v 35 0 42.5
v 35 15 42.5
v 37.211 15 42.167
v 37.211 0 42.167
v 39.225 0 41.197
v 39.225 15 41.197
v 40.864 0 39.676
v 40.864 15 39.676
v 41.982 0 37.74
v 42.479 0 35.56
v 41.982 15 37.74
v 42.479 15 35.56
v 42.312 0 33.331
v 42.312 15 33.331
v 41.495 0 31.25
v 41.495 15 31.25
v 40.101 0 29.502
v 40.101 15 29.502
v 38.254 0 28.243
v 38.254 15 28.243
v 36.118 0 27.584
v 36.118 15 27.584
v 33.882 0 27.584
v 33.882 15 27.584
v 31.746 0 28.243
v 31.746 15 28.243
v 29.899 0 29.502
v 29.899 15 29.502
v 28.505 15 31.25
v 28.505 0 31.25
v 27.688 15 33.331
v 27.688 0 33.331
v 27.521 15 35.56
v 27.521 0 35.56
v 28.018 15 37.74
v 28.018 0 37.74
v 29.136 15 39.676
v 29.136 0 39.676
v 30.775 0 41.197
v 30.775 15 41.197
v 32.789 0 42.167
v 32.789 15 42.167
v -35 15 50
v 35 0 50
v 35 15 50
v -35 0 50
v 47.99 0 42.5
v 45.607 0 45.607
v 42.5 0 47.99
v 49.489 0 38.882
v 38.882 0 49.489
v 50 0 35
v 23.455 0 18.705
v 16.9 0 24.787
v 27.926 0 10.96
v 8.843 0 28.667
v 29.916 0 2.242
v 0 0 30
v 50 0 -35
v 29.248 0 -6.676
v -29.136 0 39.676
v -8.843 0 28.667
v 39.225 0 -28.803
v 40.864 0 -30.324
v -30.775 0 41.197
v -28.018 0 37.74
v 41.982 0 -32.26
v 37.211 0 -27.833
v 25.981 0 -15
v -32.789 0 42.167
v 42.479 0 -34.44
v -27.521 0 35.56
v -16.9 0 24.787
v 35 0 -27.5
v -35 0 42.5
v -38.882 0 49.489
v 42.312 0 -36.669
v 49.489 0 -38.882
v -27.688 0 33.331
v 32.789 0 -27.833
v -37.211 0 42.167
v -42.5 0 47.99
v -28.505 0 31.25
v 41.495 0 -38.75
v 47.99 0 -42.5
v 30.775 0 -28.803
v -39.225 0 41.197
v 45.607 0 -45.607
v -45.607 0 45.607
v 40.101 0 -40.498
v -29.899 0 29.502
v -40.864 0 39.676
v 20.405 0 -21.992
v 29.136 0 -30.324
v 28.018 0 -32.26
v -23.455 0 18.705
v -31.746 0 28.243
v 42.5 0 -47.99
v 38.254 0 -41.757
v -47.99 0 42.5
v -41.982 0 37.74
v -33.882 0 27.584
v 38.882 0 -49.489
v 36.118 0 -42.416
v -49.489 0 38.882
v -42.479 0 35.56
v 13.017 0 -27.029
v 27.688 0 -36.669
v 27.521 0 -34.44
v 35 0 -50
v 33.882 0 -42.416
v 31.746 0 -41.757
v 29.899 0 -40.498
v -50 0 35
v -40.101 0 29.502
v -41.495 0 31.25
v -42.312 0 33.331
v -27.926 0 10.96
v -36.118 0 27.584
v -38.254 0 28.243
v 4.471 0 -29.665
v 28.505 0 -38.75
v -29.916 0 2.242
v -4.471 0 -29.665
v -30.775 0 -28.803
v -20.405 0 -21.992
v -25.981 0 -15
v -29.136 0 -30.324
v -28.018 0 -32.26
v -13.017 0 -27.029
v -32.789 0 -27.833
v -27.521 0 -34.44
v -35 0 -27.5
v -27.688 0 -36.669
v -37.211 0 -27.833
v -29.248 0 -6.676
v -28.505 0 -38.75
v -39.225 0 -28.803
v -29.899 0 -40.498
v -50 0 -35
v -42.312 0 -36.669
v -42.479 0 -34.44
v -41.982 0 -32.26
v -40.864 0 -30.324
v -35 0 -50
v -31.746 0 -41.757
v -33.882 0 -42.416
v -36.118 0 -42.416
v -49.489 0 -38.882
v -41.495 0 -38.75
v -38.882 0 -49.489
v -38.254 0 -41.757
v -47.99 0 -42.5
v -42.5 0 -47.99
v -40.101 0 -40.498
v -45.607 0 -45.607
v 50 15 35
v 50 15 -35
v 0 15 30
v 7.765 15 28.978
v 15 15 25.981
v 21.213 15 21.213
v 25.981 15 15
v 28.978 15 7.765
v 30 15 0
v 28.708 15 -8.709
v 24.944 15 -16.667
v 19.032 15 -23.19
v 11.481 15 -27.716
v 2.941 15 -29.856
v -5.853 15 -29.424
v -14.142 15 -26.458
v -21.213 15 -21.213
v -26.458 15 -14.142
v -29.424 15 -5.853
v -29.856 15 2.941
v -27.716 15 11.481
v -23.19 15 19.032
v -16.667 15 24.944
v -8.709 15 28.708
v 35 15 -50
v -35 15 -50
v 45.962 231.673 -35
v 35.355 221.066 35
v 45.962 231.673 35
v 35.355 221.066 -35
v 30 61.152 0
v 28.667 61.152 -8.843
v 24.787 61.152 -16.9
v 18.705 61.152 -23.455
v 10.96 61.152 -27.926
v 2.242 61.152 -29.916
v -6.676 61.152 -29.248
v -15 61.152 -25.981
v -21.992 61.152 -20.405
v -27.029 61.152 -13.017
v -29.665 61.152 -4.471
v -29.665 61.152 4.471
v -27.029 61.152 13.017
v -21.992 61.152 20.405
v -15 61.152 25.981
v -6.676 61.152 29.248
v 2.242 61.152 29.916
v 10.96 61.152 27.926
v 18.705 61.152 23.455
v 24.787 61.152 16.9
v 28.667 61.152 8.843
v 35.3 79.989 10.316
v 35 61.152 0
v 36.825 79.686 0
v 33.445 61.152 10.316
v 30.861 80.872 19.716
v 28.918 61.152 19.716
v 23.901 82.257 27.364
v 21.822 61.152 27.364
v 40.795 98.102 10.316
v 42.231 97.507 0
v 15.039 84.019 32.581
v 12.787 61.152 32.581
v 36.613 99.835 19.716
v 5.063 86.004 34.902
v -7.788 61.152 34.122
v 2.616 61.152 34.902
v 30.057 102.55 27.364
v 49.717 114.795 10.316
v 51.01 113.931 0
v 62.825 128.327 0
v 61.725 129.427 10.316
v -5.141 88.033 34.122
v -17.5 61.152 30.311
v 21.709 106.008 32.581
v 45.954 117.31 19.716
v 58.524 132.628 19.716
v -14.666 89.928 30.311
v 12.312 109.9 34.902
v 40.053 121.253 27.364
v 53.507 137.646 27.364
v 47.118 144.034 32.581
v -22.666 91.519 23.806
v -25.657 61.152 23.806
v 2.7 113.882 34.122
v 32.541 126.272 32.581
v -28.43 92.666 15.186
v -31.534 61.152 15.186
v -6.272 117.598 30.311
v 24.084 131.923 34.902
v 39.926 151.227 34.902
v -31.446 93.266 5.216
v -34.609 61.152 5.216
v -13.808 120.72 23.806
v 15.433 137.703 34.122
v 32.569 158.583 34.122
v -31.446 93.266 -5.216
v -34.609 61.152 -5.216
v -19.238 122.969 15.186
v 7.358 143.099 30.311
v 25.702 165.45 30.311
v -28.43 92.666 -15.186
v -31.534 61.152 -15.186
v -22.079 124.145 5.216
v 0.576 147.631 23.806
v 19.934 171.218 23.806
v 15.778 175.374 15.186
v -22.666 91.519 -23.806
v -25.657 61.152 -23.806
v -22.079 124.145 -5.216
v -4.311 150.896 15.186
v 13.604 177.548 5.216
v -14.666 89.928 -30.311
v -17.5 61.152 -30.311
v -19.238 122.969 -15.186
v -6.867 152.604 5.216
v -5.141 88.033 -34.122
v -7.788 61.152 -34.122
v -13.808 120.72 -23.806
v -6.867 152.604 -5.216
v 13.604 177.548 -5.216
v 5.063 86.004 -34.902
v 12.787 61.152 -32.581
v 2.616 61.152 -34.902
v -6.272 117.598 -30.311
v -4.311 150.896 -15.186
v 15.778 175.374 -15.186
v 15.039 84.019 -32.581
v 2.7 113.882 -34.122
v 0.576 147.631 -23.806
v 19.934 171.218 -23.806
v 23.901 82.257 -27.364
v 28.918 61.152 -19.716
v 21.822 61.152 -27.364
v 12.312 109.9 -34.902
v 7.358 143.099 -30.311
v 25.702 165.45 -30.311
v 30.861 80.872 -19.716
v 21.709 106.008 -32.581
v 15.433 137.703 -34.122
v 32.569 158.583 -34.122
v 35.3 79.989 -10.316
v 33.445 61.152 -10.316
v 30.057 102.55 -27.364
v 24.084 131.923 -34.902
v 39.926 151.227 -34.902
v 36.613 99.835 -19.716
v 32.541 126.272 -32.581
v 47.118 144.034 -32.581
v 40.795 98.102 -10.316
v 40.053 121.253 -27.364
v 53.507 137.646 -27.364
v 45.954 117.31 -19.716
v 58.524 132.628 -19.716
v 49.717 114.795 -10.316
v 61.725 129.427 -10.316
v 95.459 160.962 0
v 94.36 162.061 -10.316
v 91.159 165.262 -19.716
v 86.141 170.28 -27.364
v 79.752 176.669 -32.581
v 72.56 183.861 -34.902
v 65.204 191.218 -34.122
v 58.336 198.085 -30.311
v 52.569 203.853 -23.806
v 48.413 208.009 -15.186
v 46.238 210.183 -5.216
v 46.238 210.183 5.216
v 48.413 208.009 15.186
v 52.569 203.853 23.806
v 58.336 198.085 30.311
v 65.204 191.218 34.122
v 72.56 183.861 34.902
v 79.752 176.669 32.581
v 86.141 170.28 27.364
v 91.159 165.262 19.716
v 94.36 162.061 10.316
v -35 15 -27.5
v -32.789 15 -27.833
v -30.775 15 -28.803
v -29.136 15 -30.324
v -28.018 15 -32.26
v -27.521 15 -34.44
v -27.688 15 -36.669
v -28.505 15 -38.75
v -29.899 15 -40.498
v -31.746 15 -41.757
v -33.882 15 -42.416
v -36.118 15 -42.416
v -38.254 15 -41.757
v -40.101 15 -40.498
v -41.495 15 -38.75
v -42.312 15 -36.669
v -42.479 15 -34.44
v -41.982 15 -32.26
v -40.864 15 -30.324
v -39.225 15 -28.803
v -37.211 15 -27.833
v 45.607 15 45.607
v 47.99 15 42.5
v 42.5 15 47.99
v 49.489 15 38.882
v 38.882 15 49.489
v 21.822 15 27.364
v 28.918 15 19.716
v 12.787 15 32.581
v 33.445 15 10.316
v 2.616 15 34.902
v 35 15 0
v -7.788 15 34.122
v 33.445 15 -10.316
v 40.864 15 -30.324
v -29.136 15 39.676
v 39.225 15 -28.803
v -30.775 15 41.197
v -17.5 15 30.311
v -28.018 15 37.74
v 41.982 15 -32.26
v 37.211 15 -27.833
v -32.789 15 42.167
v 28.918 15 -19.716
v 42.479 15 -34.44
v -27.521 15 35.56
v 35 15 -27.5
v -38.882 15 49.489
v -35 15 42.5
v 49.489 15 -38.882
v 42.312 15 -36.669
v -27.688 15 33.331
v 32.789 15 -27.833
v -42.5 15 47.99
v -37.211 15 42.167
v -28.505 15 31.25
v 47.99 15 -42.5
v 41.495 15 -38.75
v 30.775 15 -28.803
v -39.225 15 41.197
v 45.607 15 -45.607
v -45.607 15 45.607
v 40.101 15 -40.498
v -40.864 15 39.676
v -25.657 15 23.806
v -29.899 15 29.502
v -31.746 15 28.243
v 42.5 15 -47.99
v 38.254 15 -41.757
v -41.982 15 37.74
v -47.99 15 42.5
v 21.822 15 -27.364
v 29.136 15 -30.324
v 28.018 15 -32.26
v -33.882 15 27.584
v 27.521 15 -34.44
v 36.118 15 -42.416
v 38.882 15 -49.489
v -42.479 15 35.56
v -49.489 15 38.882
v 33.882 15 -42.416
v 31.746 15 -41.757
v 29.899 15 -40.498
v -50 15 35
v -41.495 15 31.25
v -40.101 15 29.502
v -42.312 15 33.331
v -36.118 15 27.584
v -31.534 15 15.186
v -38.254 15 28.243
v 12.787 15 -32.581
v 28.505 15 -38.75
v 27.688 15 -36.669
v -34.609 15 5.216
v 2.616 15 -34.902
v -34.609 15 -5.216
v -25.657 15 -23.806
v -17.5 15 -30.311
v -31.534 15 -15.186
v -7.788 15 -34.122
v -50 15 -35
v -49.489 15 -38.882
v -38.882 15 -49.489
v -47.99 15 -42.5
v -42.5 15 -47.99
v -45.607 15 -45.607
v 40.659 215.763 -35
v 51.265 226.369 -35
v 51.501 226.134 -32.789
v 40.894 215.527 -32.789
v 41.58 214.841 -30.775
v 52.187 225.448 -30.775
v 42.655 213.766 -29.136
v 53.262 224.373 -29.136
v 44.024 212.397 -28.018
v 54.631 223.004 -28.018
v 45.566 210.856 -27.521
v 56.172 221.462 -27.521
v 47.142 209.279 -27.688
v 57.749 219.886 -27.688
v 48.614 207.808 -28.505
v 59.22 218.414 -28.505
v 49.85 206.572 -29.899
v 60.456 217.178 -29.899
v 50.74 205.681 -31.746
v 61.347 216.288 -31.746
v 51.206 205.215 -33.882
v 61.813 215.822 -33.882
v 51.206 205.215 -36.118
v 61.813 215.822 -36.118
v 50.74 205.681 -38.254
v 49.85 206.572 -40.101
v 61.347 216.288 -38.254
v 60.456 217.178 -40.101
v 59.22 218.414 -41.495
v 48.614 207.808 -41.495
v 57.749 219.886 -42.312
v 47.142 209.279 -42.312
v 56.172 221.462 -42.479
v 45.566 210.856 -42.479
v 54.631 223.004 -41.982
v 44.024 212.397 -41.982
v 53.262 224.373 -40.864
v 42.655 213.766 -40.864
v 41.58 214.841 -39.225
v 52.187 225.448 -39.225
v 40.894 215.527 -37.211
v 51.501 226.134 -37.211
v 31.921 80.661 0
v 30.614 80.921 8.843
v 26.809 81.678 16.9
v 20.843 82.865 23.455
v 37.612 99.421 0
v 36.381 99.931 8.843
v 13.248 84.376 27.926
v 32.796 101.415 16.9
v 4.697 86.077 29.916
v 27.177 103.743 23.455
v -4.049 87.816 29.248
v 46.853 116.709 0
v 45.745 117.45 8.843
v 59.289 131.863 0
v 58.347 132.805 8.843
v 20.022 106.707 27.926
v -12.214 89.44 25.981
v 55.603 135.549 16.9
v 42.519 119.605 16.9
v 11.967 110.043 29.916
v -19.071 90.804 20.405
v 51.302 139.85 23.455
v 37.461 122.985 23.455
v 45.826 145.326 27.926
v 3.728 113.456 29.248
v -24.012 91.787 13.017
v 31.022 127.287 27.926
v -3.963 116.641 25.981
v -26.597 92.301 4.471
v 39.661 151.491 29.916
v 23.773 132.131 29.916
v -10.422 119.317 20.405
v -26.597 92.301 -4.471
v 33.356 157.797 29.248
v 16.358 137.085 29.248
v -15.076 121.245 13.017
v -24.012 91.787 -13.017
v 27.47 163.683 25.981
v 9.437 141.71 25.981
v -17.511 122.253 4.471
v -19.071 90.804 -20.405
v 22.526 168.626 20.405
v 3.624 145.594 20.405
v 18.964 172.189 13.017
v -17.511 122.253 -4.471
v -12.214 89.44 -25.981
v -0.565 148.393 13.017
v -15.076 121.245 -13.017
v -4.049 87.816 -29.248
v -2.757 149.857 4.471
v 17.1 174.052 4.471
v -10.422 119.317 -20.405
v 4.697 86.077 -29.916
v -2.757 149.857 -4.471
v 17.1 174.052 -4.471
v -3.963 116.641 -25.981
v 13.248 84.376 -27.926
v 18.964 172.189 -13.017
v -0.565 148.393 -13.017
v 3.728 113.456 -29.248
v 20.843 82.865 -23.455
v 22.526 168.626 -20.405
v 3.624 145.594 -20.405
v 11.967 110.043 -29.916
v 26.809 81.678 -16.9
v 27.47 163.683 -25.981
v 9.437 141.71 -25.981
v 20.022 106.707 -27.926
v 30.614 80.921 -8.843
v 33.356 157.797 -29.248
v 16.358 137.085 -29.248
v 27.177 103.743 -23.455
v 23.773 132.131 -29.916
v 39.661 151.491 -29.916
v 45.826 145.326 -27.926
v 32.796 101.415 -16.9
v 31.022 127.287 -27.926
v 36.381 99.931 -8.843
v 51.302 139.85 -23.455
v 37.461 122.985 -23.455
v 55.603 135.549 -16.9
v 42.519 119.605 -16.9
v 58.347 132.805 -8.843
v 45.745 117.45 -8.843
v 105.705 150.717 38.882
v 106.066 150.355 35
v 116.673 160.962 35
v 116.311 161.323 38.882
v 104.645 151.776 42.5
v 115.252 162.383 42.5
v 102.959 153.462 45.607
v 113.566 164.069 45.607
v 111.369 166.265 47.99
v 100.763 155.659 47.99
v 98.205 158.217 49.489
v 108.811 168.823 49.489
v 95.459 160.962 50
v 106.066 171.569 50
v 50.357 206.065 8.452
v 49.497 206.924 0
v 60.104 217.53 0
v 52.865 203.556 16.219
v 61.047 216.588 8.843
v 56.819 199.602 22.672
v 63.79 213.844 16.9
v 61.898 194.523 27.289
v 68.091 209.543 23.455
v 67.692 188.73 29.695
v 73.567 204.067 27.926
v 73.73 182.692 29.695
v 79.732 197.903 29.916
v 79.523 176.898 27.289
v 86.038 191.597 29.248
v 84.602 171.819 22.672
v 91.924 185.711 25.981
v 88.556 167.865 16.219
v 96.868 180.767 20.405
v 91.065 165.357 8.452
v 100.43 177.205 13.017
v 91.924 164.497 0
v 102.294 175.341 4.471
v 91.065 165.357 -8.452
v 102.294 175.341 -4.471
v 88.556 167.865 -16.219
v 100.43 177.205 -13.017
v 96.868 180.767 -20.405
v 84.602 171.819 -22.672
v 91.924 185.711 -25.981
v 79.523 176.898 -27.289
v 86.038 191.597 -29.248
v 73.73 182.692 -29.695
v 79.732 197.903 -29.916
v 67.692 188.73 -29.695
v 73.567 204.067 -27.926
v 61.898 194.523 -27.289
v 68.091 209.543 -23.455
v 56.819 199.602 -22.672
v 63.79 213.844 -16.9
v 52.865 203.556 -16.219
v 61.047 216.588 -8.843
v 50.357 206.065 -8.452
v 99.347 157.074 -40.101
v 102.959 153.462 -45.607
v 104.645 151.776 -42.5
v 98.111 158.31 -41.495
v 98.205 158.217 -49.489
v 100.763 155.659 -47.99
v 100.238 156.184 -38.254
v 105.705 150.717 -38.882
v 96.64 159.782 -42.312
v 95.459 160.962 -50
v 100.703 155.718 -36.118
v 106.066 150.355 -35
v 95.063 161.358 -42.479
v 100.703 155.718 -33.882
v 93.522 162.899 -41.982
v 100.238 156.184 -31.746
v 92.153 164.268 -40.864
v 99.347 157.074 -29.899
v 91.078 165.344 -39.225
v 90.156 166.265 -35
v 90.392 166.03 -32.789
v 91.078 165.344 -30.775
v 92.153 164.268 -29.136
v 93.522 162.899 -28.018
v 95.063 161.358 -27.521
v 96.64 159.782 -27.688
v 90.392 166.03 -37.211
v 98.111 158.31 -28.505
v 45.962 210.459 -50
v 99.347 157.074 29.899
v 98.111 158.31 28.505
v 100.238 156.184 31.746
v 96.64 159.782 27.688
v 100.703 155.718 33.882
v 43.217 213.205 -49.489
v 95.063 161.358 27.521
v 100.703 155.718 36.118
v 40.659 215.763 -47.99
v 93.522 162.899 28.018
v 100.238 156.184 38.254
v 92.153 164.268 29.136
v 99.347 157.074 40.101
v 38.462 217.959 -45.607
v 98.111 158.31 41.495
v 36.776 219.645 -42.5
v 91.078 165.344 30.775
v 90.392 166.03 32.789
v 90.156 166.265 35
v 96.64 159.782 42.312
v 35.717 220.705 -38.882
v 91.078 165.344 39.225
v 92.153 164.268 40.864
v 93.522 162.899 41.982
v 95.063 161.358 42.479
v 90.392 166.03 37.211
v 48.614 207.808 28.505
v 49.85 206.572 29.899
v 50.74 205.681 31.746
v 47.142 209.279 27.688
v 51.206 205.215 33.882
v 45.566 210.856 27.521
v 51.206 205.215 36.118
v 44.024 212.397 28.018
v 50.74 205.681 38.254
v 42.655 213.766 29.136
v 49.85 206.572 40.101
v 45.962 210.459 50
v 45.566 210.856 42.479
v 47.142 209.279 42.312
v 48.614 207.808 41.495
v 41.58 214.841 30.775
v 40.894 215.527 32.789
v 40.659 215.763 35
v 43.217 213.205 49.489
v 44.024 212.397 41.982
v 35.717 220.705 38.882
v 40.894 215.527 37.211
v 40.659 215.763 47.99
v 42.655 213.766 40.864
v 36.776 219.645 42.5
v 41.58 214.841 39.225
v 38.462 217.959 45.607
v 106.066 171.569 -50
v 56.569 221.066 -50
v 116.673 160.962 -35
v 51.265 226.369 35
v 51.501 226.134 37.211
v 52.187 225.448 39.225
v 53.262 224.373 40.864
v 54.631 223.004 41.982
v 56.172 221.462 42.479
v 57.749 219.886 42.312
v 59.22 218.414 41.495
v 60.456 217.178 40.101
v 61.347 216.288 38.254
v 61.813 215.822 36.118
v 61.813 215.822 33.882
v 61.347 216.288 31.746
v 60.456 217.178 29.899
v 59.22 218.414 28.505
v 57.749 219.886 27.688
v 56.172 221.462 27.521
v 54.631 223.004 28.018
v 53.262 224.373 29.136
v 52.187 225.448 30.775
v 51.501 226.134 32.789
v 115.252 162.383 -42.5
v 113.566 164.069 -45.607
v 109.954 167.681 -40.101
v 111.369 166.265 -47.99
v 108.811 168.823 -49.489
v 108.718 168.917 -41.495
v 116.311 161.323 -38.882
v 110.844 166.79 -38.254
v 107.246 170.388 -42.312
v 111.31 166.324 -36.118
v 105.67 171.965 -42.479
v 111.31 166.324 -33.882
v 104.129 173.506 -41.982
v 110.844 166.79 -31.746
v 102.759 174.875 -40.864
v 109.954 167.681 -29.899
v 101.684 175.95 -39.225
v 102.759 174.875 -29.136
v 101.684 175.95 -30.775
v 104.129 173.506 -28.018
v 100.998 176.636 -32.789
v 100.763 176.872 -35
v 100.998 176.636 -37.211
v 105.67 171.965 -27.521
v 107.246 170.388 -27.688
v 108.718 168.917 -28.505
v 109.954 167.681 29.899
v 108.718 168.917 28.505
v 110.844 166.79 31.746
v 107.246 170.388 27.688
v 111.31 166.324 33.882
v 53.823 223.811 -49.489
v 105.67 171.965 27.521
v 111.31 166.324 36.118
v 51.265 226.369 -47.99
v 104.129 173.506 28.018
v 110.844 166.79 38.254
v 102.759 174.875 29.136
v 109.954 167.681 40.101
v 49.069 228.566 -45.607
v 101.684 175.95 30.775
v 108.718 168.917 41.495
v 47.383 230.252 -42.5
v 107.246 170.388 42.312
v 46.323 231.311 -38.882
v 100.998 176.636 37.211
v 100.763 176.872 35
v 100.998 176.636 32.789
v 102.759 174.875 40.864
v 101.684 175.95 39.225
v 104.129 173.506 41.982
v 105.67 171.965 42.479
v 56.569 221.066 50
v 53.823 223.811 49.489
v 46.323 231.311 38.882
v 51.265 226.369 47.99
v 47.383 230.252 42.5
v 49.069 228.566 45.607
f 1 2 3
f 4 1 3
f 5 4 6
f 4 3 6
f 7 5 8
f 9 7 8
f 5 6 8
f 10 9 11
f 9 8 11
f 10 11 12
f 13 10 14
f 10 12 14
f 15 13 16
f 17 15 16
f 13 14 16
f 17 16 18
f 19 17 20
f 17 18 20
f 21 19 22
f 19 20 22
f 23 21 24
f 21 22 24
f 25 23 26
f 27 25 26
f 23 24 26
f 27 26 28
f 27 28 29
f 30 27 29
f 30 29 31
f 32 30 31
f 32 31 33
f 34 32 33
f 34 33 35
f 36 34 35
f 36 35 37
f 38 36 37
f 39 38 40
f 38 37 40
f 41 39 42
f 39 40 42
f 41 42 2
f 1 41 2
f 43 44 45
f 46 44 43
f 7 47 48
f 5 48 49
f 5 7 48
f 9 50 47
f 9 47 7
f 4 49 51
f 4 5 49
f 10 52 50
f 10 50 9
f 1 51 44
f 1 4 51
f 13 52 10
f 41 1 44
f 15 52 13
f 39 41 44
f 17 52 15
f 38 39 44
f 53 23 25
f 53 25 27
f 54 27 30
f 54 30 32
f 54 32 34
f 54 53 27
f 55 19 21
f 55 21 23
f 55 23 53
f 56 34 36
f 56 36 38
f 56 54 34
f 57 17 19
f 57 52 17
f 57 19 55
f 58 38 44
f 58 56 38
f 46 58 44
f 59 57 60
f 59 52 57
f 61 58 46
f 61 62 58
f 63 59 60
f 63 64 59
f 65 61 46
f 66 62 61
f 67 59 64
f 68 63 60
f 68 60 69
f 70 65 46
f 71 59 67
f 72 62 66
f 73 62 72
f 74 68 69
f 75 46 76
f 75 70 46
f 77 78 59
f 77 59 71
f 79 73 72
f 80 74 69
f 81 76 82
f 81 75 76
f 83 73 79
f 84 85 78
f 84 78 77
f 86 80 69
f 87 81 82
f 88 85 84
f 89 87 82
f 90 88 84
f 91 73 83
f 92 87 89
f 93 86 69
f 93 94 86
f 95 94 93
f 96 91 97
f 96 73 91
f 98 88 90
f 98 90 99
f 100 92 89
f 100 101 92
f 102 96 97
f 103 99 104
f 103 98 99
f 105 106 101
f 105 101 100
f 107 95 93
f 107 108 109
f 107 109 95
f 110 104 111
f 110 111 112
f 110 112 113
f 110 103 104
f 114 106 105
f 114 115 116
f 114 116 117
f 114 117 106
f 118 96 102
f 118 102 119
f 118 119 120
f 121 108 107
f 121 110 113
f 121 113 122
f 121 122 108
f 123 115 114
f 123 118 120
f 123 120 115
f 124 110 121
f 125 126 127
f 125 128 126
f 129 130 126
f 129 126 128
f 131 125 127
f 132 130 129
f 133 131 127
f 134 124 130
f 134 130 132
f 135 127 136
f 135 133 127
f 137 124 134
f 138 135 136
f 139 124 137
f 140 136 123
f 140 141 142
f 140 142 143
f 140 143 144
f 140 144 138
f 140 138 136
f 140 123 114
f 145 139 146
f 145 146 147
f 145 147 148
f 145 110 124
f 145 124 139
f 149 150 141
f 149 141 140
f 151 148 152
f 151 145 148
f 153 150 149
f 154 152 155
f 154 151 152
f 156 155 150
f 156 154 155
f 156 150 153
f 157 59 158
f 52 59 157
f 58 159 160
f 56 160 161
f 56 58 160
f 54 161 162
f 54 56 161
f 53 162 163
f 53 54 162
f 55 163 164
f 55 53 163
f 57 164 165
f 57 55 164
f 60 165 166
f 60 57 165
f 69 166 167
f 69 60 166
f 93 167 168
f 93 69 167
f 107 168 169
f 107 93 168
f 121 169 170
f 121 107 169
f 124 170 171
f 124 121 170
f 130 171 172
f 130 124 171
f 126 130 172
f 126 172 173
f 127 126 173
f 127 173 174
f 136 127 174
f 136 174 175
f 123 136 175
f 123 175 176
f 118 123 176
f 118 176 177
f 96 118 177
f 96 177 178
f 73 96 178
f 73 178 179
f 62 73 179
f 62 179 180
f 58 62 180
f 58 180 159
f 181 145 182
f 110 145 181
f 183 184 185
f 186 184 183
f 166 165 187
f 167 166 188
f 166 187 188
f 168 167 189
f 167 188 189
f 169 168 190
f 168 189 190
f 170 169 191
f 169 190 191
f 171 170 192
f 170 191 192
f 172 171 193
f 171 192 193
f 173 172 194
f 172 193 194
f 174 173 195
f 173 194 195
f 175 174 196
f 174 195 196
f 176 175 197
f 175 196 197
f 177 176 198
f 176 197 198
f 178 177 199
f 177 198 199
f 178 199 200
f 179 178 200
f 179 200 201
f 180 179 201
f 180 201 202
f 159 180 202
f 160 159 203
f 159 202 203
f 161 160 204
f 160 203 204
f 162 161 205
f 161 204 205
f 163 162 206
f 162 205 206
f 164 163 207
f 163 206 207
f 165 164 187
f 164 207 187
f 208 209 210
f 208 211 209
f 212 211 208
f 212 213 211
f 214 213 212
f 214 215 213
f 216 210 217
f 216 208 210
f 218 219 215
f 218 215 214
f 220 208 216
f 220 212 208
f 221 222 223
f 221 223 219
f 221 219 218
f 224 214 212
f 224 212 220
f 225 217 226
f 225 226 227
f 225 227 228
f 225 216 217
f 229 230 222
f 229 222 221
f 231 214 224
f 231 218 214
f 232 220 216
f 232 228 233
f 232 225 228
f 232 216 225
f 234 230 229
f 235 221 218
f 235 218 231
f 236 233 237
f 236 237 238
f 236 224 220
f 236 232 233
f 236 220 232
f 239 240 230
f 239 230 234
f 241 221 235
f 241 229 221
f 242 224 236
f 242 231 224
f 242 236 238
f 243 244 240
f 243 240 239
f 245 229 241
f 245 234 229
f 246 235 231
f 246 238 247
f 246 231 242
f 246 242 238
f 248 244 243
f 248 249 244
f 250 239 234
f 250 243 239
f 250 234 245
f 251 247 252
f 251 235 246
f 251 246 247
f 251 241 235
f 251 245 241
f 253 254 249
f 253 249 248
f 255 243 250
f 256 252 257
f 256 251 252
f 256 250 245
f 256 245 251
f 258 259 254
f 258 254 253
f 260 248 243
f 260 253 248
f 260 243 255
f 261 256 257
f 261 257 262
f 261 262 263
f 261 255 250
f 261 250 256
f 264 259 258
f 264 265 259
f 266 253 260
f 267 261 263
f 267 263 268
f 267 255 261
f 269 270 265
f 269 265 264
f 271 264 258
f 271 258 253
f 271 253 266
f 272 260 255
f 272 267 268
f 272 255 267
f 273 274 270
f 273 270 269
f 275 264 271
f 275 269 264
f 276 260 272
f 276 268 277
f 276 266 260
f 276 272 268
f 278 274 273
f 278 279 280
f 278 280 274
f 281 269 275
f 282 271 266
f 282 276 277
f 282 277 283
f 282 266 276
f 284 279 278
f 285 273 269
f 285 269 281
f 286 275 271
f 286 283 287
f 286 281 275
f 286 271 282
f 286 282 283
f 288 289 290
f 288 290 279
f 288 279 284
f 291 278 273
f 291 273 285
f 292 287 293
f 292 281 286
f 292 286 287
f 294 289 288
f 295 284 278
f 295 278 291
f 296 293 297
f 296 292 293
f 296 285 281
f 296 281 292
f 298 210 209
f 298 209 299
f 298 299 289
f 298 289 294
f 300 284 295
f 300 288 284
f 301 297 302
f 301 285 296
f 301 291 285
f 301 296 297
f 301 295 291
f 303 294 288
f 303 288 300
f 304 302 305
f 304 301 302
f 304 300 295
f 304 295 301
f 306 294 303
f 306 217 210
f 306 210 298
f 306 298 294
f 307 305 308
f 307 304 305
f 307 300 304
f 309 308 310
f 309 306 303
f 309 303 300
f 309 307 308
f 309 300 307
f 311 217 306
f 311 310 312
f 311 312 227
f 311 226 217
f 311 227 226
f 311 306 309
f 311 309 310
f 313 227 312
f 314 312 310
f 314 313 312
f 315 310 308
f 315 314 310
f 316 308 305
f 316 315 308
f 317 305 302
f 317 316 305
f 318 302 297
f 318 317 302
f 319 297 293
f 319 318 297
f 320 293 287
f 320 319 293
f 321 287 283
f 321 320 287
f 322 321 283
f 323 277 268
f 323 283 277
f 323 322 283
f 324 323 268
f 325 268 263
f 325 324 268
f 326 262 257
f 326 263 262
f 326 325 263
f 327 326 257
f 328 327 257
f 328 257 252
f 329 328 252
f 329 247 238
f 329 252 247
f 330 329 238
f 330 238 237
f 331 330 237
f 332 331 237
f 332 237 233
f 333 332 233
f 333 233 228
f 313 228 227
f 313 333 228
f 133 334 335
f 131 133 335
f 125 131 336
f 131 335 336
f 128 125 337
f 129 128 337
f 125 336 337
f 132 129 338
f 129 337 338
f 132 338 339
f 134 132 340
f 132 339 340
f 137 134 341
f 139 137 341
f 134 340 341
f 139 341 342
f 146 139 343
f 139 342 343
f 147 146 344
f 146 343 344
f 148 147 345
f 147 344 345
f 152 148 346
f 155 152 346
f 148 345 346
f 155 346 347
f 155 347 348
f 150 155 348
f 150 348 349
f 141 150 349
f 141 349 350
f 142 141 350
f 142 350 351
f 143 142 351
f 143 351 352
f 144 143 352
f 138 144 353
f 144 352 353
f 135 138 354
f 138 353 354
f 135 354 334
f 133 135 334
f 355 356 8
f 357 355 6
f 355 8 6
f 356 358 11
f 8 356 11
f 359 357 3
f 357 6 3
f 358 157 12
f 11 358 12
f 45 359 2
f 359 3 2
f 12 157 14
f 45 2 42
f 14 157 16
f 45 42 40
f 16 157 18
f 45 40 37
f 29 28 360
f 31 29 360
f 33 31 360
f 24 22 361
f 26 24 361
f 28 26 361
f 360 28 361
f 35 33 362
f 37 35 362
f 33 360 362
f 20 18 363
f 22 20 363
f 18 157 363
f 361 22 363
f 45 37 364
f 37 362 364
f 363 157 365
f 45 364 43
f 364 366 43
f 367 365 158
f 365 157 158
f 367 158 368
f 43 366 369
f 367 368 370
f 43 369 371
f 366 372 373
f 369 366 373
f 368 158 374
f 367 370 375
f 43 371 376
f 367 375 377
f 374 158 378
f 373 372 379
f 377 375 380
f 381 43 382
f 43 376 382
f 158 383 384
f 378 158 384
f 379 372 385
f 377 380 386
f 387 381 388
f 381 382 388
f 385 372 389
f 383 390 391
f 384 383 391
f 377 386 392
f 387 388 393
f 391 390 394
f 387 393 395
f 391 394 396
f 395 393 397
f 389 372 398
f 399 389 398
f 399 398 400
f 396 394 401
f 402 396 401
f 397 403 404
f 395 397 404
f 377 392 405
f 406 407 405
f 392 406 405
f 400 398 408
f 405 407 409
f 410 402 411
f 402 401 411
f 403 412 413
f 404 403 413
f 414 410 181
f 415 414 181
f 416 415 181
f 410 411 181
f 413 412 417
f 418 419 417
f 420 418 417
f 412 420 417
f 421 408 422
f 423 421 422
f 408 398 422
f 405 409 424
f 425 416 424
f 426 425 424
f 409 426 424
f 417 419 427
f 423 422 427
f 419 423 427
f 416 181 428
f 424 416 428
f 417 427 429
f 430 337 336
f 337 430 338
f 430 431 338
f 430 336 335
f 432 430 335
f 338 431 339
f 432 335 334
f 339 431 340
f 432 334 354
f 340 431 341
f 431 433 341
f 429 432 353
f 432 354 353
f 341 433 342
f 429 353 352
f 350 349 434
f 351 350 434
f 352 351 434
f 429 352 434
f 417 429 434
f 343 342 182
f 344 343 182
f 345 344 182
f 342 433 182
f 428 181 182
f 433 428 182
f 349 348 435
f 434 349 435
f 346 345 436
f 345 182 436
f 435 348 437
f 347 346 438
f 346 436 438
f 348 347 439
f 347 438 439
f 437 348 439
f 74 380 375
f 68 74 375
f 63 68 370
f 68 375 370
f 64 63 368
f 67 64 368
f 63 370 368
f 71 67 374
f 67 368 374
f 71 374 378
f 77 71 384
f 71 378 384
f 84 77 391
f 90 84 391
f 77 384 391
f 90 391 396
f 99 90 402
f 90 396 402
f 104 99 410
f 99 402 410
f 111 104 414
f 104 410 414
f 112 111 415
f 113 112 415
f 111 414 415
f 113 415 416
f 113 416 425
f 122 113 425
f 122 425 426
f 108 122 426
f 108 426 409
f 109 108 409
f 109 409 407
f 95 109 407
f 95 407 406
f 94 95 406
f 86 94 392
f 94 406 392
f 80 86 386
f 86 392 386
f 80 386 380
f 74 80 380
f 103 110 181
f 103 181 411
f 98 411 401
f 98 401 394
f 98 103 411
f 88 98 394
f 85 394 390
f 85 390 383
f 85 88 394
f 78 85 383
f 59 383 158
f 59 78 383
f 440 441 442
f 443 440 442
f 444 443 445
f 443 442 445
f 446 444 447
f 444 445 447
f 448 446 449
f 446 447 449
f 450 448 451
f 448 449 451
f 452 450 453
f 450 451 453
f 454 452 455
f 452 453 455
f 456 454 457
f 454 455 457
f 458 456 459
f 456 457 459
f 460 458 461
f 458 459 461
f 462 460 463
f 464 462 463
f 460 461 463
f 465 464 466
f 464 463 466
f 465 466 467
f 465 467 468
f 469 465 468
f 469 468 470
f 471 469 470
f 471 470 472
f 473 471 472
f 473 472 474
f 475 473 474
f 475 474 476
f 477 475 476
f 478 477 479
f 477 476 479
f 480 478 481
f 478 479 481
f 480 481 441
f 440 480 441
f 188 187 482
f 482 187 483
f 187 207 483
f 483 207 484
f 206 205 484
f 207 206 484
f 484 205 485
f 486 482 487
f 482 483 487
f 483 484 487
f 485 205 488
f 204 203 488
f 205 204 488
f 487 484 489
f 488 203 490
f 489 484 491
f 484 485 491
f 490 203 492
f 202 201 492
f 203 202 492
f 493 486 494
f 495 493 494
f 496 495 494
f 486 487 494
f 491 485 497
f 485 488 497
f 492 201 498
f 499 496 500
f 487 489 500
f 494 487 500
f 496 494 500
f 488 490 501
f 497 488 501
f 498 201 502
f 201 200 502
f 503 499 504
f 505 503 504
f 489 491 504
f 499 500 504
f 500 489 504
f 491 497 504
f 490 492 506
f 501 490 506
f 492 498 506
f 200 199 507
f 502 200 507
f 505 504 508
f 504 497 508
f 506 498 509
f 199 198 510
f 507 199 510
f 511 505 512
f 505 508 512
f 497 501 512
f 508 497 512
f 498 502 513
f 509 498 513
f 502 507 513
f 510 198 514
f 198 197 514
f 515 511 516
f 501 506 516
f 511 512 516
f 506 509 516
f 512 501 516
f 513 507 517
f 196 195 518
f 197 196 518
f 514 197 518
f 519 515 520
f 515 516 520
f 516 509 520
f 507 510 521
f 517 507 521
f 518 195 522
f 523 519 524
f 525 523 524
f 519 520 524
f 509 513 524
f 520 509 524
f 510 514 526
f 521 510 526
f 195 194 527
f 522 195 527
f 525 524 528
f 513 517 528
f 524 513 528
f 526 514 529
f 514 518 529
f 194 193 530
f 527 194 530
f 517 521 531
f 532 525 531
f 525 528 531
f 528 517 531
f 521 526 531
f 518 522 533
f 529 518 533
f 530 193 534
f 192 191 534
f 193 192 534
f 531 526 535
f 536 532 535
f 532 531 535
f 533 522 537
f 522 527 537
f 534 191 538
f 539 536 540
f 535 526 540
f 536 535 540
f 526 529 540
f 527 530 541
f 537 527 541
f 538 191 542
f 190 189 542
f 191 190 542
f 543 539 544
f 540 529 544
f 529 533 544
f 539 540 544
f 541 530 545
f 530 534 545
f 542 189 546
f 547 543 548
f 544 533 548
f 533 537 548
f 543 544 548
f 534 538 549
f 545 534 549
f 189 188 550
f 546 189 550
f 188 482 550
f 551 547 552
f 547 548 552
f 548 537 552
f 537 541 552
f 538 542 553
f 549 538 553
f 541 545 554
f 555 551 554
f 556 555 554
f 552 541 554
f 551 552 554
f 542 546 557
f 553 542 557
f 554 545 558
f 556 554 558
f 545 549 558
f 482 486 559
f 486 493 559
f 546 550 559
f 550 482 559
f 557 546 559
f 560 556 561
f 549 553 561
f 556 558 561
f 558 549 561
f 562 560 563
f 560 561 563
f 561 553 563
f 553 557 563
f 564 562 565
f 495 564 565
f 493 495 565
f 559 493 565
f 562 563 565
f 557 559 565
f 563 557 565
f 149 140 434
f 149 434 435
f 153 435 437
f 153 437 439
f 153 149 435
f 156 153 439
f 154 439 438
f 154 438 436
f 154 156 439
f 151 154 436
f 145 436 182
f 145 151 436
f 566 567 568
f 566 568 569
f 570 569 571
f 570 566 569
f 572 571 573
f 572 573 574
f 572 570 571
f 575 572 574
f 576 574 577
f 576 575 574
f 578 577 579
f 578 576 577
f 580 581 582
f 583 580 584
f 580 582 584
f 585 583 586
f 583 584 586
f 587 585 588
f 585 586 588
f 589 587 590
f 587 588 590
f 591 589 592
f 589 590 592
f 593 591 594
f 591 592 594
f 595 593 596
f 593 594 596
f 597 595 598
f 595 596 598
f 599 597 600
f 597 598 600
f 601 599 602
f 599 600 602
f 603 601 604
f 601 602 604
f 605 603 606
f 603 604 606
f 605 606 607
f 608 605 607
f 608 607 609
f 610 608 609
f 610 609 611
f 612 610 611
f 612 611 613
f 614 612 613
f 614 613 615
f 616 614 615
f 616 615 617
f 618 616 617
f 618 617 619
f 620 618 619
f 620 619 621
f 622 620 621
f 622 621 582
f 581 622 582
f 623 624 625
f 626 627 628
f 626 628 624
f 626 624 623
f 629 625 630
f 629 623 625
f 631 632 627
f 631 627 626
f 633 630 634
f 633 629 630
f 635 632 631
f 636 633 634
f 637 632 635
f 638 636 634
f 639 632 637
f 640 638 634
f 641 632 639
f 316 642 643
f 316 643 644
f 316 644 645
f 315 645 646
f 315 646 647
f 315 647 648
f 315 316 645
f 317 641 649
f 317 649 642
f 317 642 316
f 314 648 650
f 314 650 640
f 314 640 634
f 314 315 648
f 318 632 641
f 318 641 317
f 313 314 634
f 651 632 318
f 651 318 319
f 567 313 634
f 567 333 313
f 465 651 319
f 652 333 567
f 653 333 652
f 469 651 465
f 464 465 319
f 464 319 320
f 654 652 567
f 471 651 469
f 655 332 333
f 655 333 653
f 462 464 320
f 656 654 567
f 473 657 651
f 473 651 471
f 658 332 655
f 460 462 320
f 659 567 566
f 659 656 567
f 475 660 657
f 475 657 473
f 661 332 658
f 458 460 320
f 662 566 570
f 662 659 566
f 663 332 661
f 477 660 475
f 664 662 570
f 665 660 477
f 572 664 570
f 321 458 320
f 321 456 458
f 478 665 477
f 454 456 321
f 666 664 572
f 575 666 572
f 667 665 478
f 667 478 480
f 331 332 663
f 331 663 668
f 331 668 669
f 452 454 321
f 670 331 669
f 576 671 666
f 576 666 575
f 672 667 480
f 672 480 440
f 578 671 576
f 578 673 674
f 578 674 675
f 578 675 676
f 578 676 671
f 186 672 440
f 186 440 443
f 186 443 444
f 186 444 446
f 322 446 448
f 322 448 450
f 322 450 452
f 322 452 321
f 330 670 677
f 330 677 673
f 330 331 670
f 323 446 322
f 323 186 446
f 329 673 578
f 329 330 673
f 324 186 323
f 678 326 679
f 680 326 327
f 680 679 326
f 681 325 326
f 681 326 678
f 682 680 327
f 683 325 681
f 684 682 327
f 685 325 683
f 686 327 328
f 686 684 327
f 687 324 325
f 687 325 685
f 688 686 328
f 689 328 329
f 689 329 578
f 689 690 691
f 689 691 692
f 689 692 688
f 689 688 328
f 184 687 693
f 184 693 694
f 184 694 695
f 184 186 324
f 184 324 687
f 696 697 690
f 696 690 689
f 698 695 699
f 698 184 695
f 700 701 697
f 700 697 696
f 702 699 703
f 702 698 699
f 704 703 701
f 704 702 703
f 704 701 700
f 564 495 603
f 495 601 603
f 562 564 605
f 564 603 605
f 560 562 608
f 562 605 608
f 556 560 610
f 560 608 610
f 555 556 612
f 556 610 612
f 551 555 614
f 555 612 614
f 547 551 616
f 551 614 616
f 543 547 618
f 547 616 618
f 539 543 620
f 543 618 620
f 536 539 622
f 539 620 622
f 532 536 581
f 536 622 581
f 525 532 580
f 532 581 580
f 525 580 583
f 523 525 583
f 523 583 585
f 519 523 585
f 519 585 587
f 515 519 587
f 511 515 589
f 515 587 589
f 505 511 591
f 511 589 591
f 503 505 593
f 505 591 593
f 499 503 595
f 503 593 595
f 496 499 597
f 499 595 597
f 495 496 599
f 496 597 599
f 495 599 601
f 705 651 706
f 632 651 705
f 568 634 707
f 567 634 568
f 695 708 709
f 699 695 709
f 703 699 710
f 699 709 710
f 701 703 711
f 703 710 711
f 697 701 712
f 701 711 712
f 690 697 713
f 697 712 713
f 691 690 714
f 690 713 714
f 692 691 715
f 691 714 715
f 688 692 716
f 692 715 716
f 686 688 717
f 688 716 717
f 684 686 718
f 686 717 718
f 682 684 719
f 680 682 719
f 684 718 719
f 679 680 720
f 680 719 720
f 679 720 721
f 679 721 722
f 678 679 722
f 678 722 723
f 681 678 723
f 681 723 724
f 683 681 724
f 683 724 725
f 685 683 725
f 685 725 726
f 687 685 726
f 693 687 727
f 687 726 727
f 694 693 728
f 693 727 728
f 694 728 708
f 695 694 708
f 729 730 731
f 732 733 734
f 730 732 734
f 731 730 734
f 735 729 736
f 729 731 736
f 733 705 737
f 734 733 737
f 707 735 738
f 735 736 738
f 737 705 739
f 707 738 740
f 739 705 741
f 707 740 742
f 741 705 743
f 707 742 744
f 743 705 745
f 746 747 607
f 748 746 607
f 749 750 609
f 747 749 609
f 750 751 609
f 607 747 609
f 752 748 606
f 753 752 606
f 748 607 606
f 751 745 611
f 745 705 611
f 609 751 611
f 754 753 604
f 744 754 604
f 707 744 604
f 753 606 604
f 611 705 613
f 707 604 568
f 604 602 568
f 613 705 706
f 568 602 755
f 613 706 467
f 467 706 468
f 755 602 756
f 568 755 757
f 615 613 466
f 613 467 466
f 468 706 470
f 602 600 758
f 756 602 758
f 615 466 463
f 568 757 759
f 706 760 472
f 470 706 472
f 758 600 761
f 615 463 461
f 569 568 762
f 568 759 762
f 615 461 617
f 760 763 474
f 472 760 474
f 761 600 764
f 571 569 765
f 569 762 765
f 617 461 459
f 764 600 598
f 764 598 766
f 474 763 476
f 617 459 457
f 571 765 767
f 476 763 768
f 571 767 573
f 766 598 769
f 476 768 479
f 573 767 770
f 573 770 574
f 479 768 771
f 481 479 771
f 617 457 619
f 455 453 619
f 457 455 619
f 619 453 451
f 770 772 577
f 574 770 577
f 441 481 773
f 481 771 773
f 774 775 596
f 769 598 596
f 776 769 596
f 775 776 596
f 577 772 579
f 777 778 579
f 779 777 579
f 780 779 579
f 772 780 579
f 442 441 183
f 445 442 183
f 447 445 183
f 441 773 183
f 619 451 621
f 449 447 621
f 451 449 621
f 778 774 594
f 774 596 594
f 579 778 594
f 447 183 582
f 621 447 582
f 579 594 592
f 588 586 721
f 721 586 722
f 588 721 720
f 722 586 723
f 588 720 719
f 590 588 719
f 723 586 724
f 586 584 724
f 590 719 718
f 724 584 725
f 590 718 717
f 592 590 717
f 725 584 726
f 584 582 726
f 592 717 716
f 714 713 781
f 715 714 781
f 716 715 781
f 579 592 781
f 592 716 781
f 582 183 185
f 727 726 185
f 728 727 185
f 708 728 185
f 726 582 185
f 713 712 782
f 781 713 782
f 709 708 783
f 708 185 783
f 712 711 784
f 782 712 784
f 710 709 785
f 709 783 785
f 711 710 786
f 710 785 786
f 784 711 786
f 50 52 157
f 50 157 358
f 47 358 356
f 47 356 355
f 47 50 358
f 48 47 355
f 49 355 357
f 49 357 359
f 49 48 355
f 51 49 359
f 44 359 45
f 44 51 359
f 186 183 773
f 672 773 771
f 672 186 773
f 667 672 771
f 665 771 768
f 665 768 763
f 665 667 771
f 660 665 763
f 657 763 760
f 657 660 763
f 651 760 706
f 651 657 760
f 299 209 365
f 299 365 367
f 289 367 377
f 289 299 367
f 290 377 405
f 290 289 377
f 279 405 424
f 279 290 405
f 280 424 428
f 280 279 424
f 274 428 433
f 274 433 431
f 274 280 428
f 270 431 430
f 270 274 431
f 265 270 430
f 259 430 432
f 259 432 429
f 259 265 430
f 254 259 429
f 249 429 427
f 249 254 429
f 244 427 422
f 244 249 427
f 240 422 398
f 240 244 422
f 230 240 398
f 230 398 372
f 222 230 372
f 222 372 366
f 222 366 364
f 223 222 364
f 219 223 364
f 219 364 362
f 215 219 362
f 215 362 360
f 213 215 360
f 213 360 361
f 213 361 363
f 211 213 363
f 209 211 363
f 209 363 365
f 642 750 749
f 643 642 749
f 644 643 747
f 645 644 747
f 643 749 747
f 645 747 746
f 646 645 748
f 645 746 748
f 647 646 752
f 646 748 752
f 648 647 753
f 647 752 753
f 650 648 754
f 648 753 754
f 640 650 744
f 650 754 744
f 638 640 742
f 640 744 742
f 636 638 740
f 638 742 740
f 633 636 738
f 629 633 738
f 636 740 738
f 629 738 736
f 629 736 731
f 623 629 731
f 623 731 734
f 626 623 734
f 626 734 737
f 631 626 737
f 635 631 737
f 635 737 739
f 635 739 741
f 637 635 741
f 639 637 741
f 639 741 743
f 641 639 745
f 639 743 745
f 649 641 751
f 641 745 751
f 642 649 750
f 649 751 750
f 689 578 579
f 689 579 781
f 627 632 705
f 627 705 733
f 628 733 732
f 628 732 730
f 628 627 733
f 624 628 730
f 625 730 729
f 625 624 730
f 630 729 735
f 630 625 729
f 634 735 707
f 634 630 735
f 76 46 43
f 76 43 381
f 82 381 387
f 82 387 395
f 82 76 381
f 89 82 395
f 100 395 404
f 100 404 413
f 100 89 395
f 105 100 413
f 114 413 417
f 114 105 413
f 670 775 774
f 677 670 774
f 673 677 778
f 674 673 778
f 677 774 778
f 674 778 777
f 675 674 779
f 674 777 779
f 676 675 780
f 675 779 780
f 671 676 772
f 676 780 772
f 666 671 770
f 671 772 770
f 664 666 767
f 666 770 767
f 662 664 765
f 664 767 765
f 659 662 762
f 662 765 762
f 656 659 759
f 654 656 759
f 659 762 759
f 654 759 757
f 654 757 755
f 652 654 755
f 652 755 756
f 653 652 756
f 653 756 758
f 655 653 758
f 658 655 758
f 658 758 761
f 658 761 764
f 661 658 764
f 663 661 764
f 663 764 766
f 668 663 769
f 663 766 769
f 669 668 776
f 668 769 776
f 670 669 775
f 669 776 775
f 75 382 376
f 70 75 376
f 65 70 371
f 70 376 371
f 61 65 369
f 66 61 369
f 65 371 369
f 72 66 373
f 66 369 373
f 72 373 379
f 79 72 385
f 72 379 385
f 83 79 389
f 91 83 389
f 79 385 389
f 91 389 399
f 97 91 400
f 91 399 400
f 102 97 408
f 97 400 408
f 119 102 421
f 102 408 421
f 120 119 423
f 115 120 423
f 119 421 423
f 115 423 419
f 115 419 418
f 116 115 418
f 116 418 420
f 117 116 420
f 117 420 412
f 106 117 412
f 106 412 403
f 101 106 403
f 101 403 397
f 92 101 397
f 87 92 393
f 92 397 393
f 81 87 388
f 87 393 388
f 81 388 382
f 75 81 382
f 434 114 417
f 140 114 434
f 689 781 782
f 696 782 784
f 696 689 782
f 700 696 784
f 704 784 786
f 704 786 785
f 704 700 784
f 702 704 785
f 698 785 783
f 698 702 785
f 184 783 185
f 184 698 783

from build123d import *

# Parameters (mm, degrees)
SKETCH1_R           = 30
BOSS_EXTRUDE1_DEPTH = 15
SKETCH2_R           = 7.5
CUT_EXTRUDE1_DEPTH  = 15
SKETCH4_R           = 35
SKETCH4_R_2         = 30
BOSS_EXTRUDE2_DEPTH = 15
SKETCH7_R           = 7.5
SKETCH7_R_2         = 30
CUT_EXTRUDE2_DEPTH  = 15


with BuildPart() as part:
    # Sketch1 → Boss-Extrude1 (new body)
    with BuildSketch(Plane(origin=(0, 0, 0), x_dir=(1, 0, 0), z_dir=(0, 1, 0))):
        with BuildLine():
            Line((35, -50), (-35, -50))
            ThreePointArc((-35, -50), (-45.606601718, -45.606601718), (-50, -35))
            Line((-50, -35), (-50, 35))
            ThreePointArc((-50, 35), (-45.606601718, 45.606601718), (-35, 50))
            Line((-35, 50), (35, 50))
            ThreePointArc((35, 50), (45.606601718, 45.606601718), (50, 35))
            Line((50, 35), (50, -35))
            ThreePointArc((50, -35), (45.606601718, -45.606601718), (35, -50))
        make_face()
        with Locations(Location((0, 0, 0), (0, 0, 270))):
            Circle(SKETCH1_R, mode=Mode.SUBTRACT)
    extrude(amount=BOSS_EXTRUDE1_DEPTH)

    # Sketch2 → Cut-Extrude1 (cut)
    with BuildSketch(Plane(origin=(0, 15, 0), x_dir=(1, 0, 0), z_dir=(0, 1, 0))):
        with Locations(Location((-35, 35, 0), (0, 0, 270))):
            Circle(SKETCH2_R)
        with Locations(Location((35, 35, 0), (0, 0, 270))):
            Circle(SKETCH2_R)
        with Locations(Location((35, -35, 0), (0, 0, 270))):
            Circle(SKETCH2_R)
        with Locations(Location((-35, -35, 0), (0, 0, 270))):
            Circle(SKETCH2_R)
    extrude(amount=-CUT_EXTRUDE1_DEPTH, mode=Mode.SUBTRACT)

    # Sweep1: sweep along a path in Sketch5
    with BuildLine(Plane.XY) as sweep1_path:
        Line((0, 15), (0, 61.152236891))
        ThreePointArc((0, 61.152236891), (9.895660774, 110.901083099), (38.076118446, 153.076118446))
        Line((38.076118446, 153.076118446), (70.710678119, 185.710678119))
    # Sketch4 → Sweep1 (sweep)
    with BuildSketch(Plane(origin=(0, 15, 0), x_dir=(1, 0, 0), z_dir=(0, 1, 0))):
        Circle(SKETCH4_R)
        Circle(SKETCH4_R_2, mode=Mode.SUBTRACT)
    sweep(path=sweep1_path.line)

    # Sketch6 → Boss-Extrude2 (add)
    with BuildSketch(Plane(origin=(128.210678119, 128.210678119, 0), x_dir=(0, 0, -1), z_dir=(0.7071067811865477, 0.7071067811865474, 0))):
        with BuildLine():
            Line((35, 31.317279836), (-35, 31.317279836))
            ThreePointArc((-35, 31.317279836), (-45.606601718, 35.710678119), (-50, 46.317279836))
            Line((-50, 46.317279836), (-50, 116.317279836))
            ThreePointArc((-50, 116.317279836), (-45.606601718, 126.923881554), (-35, 131.317279836))
            Line((-35, 131.317279836), (35, 131.317279836))
            ThreePointArc((35, 131.317279836), (45.606601718, 126.923881554), (50, 116.317279836))
            Line((50, 116.317279836), (50, 46.317279836))
            ThreePointArc((50, 46.317279836), (45.606601718, 35.710678119), (35, 31.317279836))
        make_face()
    extrude(amount=BOSS_EXTRUDE2_DEPTH)

    # Sketch7 → Cut-Extrude2 (cut)
    with BuildSketch(Plane(origin=(138.817279836, 138.817279836, 0), x_dir=(0, 0, -1), z_dir=(0.7071067811865477, 0.7071067811865474, 0))):
        with Locations(Location((-35, 116.317279836, 0), (0, 0, 90))):
            Circle(SKETCH7_R)
        with Locations(Location((35, 116.317279836, 0), (0, 0, 90))):
            Circle(SKETCH7_R)
        with Locations(Location((35, 46.317279836, 0), (0, 0, 90))):
            Circle(SKETCH7_R)
        with Locations(Location((-35, 46.317279836, 0), (0, 0, 90))):
            Circle(SKETCH7_R)
        with Locations(Location((0, 81.317279836, 0), (0, 0, 90))):
            Circle(SKETCH7_R_2)
    extrude(amount=-CUT_EXTRUDE2_DEPTH, mode=Mode.SUBTRACT)


solid = part.part
